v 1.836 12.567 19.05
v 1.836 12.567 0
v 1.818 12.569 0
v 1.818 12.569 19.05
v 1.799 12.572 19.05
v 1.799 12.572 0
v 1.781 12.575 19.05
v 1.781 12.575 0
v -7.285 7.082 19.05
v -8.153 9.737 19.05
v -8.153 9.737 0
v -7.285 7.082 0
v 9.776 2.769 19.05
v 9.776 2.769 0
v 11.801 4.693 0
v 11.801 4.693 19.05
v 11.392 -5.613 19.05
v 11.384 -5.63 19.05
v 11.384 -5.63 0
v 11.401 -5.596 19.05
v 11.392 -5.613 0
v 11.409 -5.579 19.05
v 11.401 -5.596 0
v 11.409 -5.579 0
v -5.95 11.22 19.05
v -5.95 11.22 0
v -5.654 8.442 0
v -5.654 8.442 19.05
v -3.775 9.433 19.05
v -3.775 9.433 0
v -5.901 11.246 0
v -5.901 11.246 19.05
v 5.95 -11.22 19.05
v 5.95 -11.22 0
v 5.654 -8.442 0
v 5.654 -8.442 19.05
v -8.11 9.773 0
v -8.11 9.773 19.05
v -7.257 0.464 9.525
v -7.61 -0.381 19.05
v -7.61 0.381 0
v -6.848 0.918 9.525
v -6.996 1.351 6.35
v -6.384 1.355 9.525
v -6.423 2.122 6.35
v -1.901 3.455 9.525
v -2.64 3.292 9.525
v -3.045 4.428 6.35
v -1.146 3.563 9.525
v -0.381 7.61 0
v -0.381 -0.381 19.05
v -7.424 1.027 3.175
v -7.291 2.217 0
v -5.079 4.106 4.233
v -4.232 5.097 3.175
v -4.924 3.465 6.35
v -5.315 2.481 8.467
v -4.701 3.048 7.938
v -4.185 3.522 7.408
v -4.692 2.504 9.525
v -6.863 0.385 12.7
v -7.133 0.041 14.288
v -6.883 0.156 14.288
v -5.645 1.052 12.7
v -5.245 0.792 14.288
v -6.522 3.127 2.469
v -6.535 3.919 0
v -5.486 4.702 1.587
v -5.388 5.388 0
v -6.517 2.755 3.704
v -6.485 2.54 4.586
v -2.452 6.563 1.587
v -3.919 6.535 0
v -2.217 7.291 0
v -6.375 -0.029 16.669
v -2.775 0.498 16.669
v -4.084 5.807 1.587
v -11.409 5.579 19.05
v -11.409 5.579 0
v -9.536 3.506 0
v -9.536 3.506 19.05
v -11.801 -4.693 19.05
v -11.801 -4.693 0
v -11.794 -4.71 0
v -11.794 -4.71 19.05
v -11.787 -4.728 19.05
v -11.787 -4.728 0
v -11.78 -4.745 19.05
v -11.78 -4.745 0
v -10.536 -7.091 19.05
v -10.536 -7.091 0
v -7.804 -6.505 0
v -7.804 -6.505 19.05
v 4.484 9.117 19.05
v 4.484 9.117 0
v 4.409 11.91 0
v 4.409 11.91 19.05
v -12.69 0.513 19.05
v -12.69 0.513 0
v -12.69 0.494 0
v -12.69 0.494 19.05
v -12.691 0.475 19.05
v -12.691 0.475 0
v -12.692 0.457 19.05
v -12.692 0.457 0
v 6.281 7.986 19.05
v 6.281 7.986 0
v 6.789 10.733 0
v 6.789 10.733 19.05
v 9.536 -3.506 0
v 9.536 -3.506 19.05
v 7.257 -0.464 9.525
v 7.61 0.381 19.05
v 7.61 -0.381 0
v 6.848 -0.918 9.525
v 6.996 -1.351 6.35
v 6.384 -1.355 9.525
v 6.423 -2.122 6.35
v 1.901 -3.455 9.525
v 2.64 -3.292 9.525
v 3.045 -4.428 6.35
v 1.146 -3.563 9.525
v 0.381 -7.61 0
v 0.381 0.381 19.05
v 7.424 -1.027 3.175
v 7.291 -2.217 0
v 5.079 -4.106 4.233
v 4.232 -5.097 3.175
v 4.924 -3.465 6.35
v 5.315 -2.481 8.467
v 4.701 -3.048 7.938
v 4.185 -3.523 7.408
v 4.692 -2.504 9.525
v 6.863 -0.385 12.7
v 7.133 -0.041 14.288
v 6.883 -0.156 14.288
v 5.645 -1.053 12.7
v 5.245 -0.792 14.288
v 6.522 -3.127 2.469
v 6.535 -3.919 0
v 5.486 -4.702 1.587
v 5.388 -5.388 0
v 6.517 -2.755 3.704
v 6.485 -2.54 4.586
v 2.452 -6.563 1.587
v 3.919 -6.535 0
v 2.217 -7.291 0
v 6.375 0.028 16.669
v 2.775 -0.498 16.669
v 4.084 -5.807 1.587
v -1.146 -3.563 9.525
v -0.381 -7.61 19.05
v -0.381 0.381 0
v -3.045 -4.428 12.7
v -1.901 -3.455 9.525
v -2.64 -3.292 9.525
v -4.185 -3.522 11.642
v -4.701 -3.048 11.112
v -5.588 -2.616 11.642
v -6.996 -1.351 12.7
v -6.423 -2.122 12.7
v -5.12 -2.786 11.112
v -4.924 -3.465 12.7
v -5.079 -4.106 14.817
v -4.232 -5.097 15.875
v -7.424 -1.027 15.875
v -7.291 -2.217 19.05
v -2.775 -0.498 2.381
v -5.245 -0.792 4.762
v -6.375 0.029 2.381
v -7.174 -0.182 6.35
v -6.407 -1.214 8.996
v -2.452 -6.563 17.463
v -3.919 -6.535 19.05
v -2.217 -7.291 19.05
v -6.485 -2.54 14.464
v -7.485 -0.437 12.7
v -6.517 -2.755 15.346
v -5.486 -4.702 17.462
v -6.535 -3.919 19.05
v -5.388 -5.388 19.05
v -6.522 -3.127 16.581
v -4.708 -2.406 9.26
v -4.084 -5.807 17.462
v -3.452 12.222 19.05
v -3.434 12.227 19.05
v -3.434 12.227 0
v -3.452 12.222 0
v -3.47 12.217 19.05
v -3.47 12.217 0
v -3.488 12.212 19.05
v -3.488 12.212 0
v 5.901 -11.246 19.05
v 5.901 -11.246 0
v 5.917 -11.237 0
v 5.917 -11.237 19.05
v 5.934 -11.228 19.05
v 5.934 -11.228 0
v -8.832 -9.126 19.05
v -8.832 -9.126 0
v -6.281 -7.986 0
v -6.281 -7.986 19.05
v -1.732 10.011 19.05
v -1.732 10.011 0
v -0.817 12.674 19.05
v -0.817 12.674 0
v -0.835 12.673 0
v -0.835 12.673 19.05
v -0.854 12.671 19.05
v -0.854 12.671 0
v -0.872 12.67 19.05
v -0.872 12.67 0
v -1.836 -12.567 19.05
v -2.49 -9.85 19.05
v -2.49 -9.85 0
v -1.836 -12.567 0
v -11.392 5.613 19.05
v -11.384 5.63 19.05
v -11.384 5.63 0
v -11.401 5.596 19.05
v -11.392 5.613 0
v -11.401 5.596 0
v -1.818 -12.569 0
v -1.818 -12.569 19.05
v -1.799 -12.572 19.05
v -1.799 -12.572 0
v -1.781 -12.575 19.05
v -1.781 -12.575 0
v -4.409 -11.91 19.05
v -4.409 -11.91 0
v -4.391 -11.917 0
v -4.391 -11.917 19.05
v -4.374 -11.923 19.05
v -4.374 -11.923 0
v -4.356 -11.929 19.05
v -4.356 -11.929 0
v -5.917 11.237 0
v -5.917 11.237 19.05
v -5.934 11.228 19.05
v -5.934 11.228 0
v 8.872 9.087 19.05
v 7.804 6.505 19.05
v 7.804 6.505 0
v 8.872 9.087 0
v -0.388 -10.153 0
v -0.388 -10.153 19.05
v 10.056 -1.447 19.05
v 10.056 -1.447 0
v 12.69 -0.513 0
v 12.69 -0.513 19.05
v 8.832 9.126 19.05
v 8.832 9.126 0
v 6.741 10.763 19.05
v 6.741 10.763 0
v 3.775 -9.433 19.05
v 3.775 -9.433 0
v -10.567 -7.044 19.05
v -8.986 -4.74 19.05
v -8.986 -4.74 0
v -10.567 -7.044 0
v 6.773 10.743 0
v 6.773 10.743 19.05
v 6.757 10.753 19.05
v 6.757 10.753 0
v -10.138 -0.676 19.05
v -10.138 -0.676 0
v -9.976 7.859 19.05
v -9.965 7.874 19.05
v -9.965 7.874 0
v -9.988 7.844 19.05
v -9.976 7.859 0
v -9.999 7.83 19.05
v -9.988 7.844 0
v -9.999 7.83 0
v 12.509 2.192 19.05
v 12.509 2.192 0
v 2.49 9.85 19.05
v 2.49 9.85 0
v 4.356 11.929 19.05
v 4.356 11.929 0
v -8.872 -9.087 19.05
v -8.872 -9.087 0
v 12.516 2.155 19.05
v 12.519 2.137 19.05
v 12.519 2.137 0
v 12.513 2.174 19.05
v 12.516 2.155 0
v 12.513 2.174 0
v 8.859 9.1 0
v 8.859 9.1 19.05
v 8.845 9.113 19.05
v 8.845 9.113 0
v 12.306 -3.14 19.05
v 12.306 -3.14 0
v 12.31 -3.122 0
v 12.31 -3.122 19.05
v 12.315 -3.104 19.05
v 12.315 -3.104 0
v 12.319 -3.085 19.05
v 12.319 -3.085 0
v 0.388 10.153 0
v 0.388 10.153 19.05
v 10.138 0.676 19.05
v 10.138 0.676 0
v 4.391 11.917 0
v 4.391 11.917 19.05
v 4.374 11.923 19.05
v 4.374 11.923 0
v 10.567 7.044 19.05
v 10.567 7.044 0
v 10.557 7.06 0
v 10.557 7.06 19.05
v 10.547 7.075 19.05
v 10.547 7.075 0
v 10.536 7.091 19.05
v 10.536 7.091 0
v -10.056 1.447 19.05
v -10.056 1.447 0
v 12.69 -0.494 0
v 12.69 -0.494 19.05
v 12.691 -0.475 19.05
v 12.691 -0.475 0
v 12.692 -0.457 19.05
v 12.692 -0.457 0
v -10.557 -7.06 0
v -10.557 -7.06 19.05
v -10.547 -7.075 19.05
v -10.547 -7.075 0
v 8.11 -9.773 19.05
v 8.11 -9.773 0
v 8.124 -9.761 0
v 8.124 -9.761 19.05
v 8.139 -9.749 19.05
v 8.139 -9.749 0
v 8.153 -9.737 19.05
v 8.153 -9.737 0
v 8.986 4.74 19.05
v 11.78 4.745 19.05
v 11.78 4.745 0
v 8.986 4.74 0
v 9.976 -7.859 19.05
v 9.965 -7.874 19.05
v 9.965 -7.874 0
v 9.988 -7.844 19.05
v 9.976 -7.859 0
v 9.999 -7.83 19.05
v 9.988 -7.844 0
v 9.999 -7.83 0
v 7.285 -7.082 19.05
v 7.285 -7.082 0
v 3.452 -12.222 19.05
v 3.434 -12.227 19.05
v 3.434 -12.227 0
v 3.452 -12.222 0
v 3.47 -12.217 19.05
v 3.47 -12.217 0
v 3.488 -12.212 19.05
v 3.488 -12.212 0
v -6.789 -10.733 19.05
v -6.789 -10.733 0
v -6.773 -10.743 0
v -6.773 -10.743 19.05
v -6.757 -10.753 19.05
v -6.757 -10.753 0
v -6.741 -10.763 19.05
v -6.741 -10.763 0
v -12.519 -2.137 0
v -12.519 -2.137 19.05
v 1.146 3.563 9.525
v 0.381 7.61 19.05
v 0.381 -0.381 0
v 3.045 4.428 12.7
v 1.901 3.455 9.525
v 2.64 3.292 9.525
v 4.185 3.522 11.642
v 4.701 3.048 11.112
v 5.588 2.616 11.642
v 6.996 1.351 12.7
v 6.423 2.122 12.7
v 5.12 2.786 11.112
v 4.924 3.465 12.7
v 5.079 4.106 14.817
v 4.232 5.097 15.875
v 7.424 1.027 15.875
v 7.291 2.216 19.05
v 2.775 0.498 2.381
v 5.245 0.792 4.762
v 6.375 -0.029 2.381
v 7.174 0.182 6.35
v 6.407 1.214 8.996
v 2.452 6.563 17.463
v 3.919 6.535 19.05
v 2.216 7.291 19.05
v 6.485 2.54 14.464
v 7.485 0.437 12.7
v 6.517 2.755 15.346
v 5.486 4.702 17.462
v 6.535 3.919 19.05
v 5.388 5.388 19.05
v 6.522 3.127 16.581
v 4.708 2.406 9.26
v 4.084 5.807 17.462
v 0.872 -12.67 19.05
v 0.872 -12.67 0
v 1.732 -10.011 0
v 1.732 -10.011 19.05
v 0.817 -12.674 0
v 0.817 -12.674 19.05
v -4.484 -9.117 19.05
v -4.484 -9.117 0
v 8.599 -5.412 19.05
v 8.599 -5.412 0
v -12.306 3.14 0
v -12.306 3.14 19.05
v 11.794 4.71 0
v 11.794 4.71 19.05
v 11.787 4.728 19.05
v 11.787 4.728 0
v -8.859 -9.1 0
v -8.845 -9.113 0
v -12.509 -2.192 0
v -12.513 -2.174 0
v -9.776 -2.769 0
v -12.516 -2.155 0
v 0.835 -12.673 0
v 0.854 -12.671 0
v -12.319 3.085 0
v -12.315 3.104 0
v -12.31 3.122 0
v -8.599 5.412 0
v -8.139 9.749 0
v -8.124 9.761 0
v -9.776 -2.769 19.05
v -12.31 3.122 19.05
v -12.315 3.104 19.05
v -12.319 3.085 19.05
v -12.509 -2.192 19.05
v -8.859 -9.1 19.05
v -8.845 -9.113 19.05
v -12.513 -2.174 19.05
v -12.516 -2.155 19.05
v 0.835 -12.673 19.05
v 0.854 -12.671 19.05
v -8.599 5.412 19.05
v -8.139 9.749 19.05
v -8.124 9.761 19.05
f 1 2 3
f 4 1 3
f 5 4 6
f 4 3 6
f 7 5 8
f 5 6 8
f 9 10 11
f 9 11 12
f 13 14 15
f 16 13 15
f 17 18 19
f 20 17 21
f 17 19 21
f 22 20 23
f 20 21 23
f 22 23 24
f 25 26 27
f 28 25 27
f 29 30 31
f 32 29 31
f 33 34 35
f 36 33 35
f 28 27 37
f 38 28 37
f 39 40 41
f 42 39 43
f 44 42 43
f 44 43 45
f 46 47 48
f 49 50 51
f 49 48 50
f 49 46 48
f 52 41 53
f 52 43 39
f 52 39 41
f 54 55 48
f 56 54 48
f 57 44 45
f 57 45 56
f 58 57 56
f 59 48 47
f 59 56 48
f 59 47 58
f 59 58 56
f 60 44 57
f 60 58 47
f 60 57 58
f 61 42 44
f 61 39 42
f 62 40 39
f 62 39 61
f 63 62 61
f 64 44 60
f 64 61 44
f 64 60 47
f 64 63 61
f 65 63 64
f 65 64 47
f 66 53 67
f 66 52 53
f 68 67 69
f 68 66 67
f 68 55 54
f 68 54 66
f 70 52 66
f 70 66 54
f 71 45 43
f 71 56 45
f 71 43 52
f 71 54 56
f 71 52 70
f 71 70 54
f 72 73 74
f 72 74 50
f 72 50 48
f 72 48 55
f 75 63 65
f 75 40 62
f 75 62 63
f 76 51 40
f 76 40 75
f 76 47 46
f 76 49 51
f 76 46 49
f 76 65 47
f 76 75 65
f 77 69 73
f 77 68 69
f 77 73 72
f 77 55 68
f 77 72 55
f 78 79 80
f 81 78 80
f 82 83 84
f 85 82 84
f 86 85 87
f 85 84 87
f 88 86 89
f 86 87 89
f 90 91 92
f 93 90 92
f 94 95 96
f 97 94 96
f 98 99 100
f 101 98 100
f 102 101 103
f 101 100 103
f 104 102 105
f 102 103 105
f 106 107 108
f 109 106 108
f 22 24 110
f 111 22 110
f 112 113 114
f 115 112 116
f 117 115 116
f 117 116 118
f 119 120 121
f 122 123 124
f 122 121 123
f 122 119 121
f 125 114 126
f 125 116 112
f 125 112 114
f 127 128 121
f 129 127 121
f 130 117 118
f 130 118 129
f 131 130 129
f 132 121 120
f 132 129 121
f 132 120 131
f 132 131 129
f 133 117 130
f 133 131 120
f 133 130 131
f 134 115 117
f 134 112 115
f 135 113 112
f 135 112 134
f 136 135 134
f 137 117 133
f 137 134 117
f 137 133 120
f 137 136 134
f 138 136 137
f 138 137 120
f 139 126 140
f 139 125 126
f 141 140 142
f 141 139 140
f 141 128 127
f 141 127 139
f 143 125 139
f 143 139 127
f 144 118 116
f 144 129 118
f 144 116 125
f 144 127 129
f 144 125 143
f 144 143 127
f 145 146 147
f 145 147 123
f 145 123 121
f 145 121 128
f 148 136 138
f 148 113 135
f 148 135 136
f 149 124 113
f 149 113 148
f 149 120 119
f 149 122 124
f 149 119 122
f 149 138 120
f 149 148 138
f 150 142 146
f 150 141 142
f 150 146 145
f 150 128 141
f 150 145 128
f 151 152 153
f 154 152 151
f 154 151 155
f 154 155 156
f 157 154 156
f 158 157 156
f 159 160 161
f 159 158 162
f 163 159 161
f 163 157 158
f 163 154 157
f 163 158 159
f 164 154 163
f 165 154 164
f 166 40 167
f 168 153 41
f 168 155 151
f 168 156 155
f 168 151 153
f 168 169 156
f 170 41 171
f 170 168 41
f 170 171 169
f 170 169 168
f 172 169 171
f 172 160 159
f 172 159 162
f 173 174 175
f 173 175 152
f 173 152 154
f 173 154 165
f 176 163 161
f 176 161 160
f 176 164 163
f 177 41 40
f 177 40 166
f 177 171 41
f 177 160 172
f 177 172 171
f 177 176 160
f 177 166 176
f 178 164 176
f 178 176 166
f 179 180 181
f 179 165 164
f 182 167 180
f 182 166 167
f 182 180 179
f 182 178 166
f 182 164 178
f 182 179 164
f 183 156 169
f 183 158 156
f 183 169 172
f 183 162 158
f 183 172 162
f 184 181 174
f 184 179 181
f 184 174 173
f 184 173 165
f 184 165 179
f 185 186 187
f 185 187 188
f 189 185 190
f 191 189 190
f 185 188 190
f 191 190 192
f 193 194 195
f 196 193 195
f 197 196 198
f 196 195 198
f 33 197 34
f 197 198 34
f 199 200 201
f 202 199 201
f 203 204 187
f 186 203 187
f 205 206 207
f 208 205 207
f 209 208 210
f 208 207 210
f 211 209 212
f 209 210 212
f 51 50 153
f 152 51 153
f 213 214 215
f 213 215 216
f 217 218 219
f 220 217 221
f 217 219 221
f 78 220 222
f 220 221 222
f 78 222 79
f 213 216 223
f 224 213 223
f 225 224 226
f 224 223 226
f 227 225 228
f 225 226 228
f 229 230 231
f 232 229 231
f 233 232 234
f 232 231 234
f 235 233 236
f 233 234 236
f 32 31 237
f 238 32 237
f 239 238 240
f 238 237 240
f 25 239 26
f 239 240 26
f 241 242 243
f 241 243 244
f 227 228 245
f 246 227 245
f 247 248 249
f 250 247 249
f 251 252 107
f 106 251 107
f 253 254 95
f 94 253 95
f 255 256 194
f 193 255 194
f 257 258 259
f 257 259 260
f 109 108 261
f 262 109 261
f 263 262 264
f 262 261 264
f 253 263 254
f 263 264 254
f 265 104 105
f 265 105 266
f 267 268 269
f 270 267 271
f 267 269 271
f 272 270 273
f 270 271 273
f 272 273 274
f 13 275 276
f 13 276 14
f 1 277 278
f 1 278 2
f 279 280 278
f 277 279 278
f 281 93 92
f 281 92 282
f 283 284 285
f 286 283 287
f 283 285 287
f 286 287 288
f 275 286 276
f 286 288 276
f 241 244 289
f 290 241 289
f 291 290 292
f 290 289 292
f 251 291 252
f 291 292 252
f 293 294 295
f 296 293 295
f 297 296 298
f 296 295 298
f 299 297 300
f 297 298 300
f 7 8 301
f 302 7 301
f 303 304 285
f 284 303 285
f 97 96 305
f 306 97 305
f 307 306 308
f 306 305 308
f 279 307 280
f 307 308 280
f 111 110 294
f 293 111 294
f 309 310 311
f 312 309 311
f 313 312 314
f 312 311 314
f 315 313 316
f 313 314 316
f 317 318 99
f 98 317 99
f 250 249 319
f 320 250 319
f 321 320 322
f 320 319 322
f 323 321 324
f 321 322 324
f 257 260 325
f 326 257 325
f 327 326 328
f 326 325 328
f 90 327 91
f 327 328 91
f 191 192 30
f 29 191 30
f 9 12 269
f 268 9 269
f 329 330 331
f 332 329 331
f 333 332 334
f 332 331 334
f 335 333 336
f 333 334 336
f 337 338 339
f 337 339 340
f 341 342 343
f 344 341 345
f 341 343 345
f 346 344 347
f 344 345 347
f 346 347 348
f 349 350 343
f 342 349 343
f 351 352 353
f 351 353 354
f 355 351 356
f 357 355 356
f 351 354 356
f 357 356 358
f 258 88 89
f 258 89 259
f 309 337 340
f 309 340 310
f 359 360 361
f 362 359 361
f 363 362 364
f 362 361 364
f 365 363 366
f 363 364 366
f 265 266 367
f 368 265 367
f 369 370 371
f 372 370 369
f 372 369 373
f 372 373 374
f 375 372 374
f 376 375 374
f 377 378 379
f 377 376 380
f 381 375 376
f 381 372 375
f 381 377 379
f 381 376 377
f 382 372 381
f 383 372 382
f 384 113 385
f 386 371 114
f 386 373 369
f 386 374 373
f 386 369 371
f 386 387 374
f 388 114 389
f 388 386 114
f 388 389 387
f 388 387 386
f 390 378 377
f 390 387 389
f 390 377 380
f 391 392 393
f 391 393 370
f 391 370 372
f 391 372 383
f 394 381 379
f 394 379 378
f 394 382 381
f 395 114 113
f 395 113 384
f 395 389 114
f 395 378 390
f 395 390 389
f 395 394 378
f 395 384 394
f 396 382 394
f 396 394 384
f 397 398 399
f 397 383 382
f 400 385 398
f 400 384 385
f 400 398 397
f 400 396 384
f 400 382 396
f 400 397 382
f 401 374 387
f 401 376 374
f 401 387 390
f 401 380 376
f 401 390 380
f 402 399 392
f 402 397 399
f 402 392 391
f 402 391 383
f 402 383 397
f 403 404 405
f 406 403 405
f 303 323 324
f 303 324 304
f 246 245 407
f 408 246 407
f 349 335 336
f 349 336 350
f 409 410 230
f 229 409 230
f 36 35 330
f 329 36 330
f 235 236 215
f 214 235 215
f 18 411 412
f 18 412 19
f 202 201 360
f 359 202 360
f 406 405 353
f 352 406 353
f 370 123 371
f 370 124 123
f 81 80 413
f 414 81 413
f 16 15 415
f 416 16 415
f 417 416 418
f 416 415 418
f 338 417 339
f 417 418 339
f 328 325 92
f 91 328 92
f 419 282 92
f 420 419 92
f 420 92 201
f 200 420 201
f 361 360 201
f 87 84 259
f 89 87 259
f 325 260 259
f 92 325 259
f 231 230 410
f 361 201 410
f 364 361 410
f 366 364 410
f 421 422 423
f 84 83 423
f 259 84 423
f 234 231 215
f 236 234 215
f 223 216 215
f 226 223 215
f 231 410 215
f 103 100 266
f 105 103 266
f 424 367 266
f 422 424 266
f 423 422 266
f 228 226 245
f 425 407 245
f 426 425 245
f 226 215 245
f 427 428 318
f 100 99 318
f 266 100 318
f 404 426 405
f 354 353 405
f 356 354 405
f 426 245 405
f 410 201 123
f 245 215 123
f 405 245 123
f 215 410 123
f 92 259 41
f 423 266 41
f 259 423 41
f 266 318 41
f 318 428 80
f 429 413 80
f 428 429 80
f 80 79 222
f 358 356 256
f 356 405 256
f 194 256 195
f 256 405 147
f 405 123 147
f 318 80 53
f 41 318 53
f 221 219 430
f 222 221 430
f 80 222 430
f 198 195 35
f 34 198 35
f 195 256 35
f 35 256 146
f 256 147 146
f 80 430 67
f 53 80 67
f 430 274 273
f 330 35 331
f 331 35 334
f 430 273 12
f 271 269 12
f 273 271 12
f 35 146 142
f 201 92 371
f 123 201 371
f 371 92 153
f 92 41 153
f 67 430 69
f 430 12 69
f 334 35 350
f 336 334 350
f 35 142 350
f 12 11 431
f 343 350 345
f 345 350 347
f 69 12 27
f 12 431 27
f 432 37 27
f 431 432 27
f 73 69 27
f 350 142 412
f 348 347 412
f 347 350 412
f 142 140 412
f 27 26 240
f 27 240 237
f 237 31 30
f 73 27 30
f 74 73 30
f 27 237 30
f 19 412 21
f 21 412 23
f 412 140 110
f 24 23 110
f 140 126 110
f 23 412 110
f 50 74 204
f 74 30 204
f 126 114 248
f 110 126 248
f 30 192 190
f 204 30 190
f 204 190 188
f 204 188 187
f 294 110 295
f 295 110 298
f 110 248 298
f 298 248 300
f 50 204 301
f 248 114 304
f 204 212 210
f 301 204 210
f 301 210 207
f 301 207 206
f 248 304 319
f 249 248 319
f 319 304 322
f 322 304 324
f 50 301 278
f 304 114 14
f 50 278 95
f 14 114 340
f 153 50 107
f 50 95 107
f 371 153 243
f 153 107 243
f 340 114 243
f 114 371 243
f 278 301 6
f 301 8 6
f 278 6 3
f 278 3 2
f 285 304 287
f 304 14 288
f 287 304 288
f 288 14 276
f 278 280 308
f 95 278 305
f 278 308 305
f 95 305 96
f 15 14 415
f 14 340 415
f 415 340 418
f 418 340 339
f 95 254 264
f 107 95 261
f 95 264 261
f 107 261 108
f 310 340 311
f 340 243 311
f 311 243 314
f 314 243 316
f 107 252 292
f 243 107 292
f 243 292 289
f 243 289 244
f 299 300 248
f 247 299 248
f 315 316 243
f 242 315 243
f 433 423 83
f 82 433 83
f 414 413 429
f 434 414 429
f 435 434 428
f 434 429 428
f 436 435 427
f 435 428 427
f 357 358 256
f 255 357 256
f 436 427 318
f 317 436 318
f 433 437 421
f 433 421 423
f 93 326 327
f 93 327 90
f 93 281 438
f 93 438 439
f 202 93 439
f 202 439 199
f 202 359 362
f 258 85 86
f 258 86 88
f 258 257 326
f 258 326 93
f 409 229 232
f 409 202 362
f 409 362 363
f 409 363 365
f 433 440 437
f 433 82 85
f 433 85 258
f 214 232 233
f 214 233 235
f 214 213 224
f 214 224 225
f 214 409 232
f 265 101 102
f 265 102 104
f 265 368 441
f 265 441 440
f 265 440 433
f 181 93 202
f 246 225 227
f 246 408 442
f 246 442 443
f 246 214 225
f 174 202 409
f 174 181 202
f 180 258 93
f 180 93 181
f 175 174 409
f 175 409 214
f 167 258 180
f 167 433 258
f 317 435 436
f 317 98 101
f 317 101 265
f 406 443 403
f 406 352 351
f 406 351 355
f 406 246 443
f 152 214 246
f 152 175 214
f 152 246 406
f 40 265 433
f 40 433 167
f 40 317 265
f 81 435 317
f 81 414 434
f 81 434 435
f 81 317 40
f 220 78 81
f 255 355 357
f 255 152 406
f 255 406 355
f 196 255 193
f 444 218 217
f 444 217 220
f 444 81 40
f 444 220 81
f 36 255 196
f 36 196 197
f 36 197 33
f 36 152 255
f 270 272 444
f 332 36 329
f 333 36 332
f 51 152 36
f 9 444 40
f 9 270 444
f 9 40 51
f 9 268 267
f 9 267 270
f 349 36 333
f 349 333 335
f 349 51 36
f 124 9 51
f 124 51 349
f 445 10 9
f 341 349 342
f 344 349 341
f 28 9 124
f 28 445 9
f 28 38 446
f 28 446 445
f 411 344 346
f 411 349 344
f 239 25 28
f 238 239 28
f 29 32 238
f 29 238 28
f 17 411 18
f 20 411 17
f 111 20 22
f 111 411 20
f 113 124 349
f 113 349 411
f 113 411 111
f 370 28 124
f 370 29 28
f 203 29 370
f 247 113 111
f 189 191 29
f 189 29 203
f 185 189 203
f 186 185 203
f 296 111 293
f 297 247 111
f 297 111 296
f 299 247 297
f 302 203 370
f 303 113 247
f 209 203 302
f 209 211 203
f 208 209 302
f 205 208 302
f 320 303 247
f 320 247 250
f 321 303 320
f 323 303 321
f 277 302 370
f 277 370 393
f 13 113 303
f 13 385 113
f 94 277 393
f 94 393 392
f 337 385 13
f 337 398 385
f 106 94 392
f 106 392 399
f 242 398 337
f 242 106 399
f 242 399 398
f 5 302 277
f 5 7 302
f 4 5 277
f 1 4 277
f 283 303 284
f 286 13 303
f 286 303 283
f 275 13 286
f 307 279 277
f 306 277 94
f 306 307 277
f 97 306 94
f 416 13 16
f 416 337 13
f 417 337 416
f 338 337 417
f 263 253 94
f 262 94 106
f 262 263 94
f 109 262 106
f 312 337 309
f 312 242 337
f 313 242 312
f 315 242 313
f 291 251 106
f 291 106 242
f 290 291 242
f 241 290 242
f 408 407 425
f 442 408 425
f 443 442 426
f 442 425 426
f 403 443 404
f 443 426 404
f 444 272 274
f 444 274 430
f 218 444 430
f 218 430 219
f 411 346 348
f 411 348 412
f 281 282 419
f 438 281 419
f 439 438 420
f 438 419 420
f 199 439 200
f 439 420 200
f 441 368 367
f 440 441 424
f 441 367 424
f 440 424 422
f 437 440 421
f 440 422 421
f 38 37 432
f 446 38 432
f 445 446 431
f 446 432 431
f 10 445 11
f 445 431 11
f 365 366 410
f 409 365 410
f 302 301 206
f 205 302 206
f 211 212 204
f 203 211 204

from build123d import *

# Parameters (mm, degrees)
F1_DEPTH = 19.05


with BuildPart() as f1:
    # F0 (on Top) → F1 (new body)
    with BuildSketch(Plane.XY):
        with BuildLine():
            ThreePointArc((10.16, 0), (10.154376, 0.337992), (10.137512, 0.675609))
            ThreePointArc((10.137512, 0.675609), (10.011357, 1.731566), (9.775516, 2.768553))
            ThreePointArc((9.775516, 2.768553), (9.432572, 3.775206), (8.986283, 4.740497))
            ThreePointArc((8.986283, 4.740497), (8.441539, 5.653851), (7.804307, 6.505259))
            ThreePointArc((7.804307, 6.505259), (7.081569, 7.285395), (6.281244, 7.98571))
            ThreePointArc((6.281244, 7.98571), (5.412101, 8.598533), (4.483662, 9.117148))
            ThreePointArc((4.483662, 9.117148), (3.506098, 9.535873), (2.490121, 9.850122))
            ThreePointArc((2.490121, 9.850122), (1.446862, 10.05645), (0.387751, 10.152598))
            ThreePointArc((0.387751, 10.152598), (-0.675609, 10.137512), (-1.731566, 10.011357))
            ThreePointArc((-1.731566, 10.011357), (-2.768553, 9.775516), (-3.775206, 9.432572))
            ThreePointArc((-3.775206, 9.432572), (-4.740497, 8.986283), (-5.653851, 8.441539))
            ThreePointArc((-5.653851, 8.441539), (-6.505259, 7.804307), (-7.285395, 7.081569))
            ThreePointArc((-7.285395, 7.081569), (-7.98571, 6.281244), (-8.598533, 5.412101))
            ThreePointArc((-8.598533, 5.412101), (-9.117148, 4.483662), (-9.535873, 3.506098))
            ThreePointArc((-9.535873, 3.506098), (-9.850122, 2.490121), (-10.05645, 1.446862))
            ThreePointArc((-10.05645, 1.446862), (-10.152598, 0.387751), (-10.137512, -0.675609))
            ThreePointArc((-10.137512, -0.675609), (-10.011357, -1.731566), (-9.775516, -2.768553))
            ThreePointArc((-9.775516, -2.768553), (-9.432572, -3.775206), (-8.986283, -4.740497))
            ThreePointArc((-8.986283, -4.740497), (-8.441539, -5.653851), (-7.804307, -6.505259))
            ThreePointArc((-7.804307, -6.505259), (-7.081569, -7.285395), (-6.281244, -7.98571))
            ThreePointArc((-6.281244, -7.98571), (-5.412101, -8.598533), (-4.483662, -9.117148))
            ThreePointArc((-4.483662, -9.117148), (-3.506098, -9.535873), (-2.490121, -9.850122))
            ThreePointArc((-2.490121, -9.850122), (-1.446862, -10.05645), (-0.387751, -10.152598))
            ThreePointArc((-0.387751, -10.152598), (0.675609, -10.137512), (1.731566, -10.011357))
            ThreePointArc((1.731566, -10.011357), (2.768553, -9.775516), (3.775206, -9.432572))
            ThreePointArc((3.775206, -9.432572), (4.740497, -8.986283), (5.653851, -8.441539))
            ThreePointArc((5.653851, -8.441539), (6.505259, -7.804307), (7.285395, -7.081569))
            ThreePointArc((7.285395, -7.081569), (7.98571, -6.281244), (8.598533, -5.412101))
            ThreePointArc((8.598533, -5.412101), (9.117148, -4.483662), (9.535873, -3.506098))
            ThreePointArc((9.535873, -3.506098), (9.850122, -2.490121), (10.05645, -1.446862))
            ThreePointArc((10.05645, -1.446862), (10.134079, -0.725281), (10.16, 0))
        make_face()
        with BuildLine():
            ThreePointArc((0.387751, 10.152598), (1.446862, 10.05645), (2.490121, 9.850122))
            Line((2.490121, 9.850122), (1.836296, 12.566544))
            ThreePointArc((1.836296, 12.566544), (1.808578, 12.570563), (1.780851, 12.574521))
            Line((1.780851, 12.574521), (0.387751, 10.152598))
        make_face()
        with BuildLine():
            ThreePointArc((2.490121, 9.850122), (3.506098, 9.535873), (4.483662, 9.117148))
            Line((4.483662, 9.117148), (4.4089, 11.910147))
            ThreePointArc((4.4089, 11.910147), (4.382623, 11.919841), (4.356325, 11.929478))
            Line((4.356325, 11.929478), (2.490121, 9.850122))
        make_face()
        with BuildLine():
            ThreePointArc((4.483662, 9.117148), (5.412101, 8.598533), (6.281244, 7.98571))
            Line((6.281244, 7.98571), (6.788813, 10.73322))
            ThreePointArc((6.788813, 10.73322), (6.765126, 10.748166), (6.741406, 10.763059))
            Line((6.741406, 10.763059), (4.483662, 9.117148))
        make_face()
        with BuildLine():
            ThreePointArc((6.281244, 7.98571), (7.081569, 7.285395), (7.804307, 6.505259))
            Line((7.804307, 6.505259), (8.872024, 9.0872))
            ThreePointArc((8.872024, 9.0872), (8.851961, 9.106744), (8.831856, 9.126243))
            Line((8.831856, 9.126243), (6.281244, 7.98571))
        make_face()
        with BuildLine():
            ThreePointArc((7.804307, 6.505259), (8.441539, 5.653851), (8.986283, 4.740497))
            Line((8.986283, 4.740497), (10.567484, 7.044025))
            ThreePointArc((10.567484, 7.044025), (10.551923, 7.067313), (10.536312, 7.090567))
            Line((10.536312, 7.090567), (7.804307, 6.505259))
        make_face()
        with BuildLine():
            Line((9.775516, 2.768553), (11.801094, 4.692993))
            ThreePointArc((11.801094, 4.692993), (11.790715, 4.719007), (11.78028, 4.744999))
            Line((11.78028, 4.744999), (8.986283, 4.740497))
            ThreePointArc((8.986283, 4.740497), (9.432572, 3.775206), (9.775516, 2.768553))
        make_face()
        with BuildLine():
            Line((10.137512, 0.675609), (12.51894, 2.136854))
            ThreePointArc((12.51894, 2.136854), (12.514197, 2.164458), (12.509393, 2.192051))
            Line((12.509393, 2.192051), (9.775516, 2.768553))
            ThreePointArc((9.775516, 2.768553), (10.011357, 1.731566), (10.137512, 0.675609))
        make_face()
        with BuildLine():
            ThreePointArc((12.305758, -3.139798), (12.312652, -3.112652), (12.319487, -3.08549))
            Line((12.319487, -3.08549), (10.05645, -1.446862))
            ThreePointArc((10.05645, -1.446862), (9.850122, -2.490121), (9.535873, -3.506098))
            Line((9.535873, -3.506098), (12.305758, -3.139798))
        make_face()
        with BuildLine():
            Line((9.999429, -7.829522), (8.598533, -5.412101))
            ThreePointArc((8.598533, -5.412101), (7.98571, -6.281244), (7.285395, -7.081569))
            Line((7.285395, -7.081569), (9.964798, -7.873551))
            ThreePointArc((9.964798, -7.873551), (9.982138, -7.851555), (9.999429, -7.829522))
        make_face()
        with BuildLine():
            Line((8.153068, -9.737427), (7.285395, -7.081569))
            ThreePointArc((7.285395, -7.081569), (6.505259, -7.804307), (5.653851, -8.441539))
            Line((5.653851, -8.441539), (8.11004, -9.773293))
            ThreePointArc((8.11004, -9.773293), (8.131574, -9.755383), (8.153068, -9.737427))
        make_face()
        with BuildLine():
            Line((5.950379, -11.219759), (5.653851, -8.441539))
            ThreePointArc((5.653851, -8.441539), (4.740497, -8.986283), (3.775206, -9.432572))
            Line((3.775206, -9.432572), (5.900834, -11.245895))
            ThreePointArc((5.900834, -11.245895), (5.925621, -11.232854), (5.950379, -11.219759))
        make_face()
        with BuildLine():
            Line((3.48763, -12.211733), (3.775206, -9.432572))
            ThreePointArc((3.775206, -9.432572), (2.768553, -9.775516), (1.731566, -10.011357))
            Line((1.731566, -10.011357), (3.433734, -12.226998))
            ThreePointArc((3.433734, -12.226998), (3.460691, -12.219395), (3.48763, -12.211733))
        make_face()
        with BuildLine():
            Line((0.872455, -12.669997), (1.731566, -10.011357))
            ThreePointArc((1.731566, -10.011357), (0.675609, -10.137512), (-0.387751, -10.152598))
            Line((-0.387751, -10.152598), (0.816563, -12.673722))
            ThreePointArc((0.816563, -12.673722), (0.844511, -12.67189), (0.872455, -12.669997))
        make_face()
        with BuildLine():
            Line((-1.780851, -12.574521), (-0.387751, -10.152598))
            ThreePointArc((-0.387751, -10.152598), (-1.446862, -10.05645), (-2.490121, -9.850122))
            Line((-2.490121, -9.850122), (-1.836296, -12.566544))
            ThreePointArc((-1.836296, -12.566544), (-1.808578, -12.570563), (-1.780851, -12.574521))
        make_face()
        with BuildLine():
            Line((-4.356325, -11.929478), (-2.490121, -9.850122))
            ThreePointArc((-2.490121, -9.850122), (-3.506098, -9.535873), (-4.483662, -9.117148))
            Line((-4.483662, -9.117148), (-4.4089, -11.910147))
            ThreePointArc((-4.4089, -11.910147), (-4.382623, -11.919841), (-4.356325, -11.929478))
        make_face()
        with BuildLine():
            Line((-6.741406, -10.763059), (-4.483662, -9.117148))
            ThreePointArc((-4.483662, -9.117148), (-5.412101, -8.598533), (-6.281244, -7.98571))
            Line((-6.281244, -7.98571), (-6.788813, -10.73322))
            ThreePointArc((-6.788813, -10.73322), (-6.765126, -10.748166), (-6.741406, -10.763059))
        make_face()
        with BuildLine():
            Line((-8.831856, -9.126243), (-6.281244, -7.98571))
            ThreePointArc((-6.281244, -7.98571), (-7.081569, -7.285395), (-7.804307, -6.505259))
            Line((-7.804307, -6.505259), (-8.872024, -9.0872))
            ThreePointArc((-8.872024, -9.0872), (-8.851961, -9.106744), (-8.831856, -9.126243))
        make_face()
        with BuildLine():
            Line((-10.536312, -7.090567), (-7.804307, -6.505259))
            ThreePointArc((-7.804307, -6.505259), (-8.441539, -5.653851), (-8.986283, -4.740497))
            Line((-8.986283, -4.740497), (-10.567484, -7.044025))
            ThreePointArc((-10.567484, -7.044025), (-10.551923, -7.067313), (-10.536312, -7.090567))
        make_face()
        with BuildLine():
            Line((-11.78028, -4.744999), (-8.986283, -4.740497))
            ThreePointArc((-8.986283, -4.740497), (-9.432572, -3.775206), (-9.775516, -2.768553))
            Line((-9.775516, -2.768553), (-11.801094, -4.692993))
            ThreePointArc((-11.801094, -4.692993), (-11.790715, -4.719007), (-11.78028, -4.744999))
        make_face()
        with BuildLine():
            Line((-12.509393, -2.192051), (-9.775516, -2.768553))
            ThreePointArc((-9.775516, -2.768553), (-10.011357, -1.731566), (-10.137512, -0.675609))
            Line((-10.137512, -0.675609), (-12.51894, -2.136854))
            ThreePointArc((-12.51894, -2.136854), (-12.514197, -2.164458), (-12.509393, -2.192051))
        make_face()
        with BuildLine():
            ThreePointArc((-8.598533, 5.412101), (-7.98571, 6.281244), (-7.285395, 7.081569))
            Line((-7.285395, 7.081569), (-9.964798, 7.873551))
            ThreePointArc((-9.964798, 7.873551), (-9.982138, 7.851555), (-9.999429, 7.829522))
            Line((-9.999429, 7.829522), (-8.598533, 5.412101))
        make_face()
        with BuildLine():
            ThreePointArc((-7.285395, 7.081569), (-6.505259, 7.804307), (-5.653851, 8.441539))
            Line((-5.653851, 8.441539), (-8.11004, 9.773293))
            ThreePointArc((-8.11004, 9.773293), (-8.131574, 9.755383), (-8.153068, 9.737427))
            Line((-8.153068, 9.737427), (-7.285395, 7.081569))
        make_face()
        with BuildLine():
            ThreePointArc((-5.653851, 8.441539), (-4.740497, 8.986283), (-3.775206, 9.432572))
            Line((-3.775206, 9.432572), (-5.900834, 11.245895))
            ThreePointArc((-5.900834, 11.245895), (-5.925621, 11.232854), (-5.950379, 11.219759))
            Line((-5.950379, 11.219759), (-5.653851, 8.441539))
        make_face()
        with BuildLine():
            ThreePointArc((-3.775206, 9.432572), (-2.768553, 9.775516), (-1.731566, 10.011357))
            Line((-1.731566, 10.011357), (-3.433734, 12.226998))
            ThreePointArc((-3.433734, 12.226998), (-3.460691, 12.219395), (-3.48763, 12.211733))
            Line((-3.48763, 12.211733), (-3.775206, 9.432572))
        make_face()
        with BuildLine():
            ThreePointArc((-1.731566, 10.011357), (-0.675609, 10.137512), (0.387751, 10.152598))
            Line((0.387751, 10.152598), (-0.816563, 12.673722))
            ThreePointArc((-0.816563, 12.673722), (-0.844511, 12.67189), (-0.872455, 12.669997))
            Line((-0.872455, 12.669997), (-1.731566, 10.011357))
        make_face()
        with BuildLine():
            ThreePointArc((-9.535873, 3.506098), (-9.117148, 4.483662), (-8.598533, 5.412101))
            Line((-8.598533, 5.412101), (-11.384047, 5.629697))
            ThreePointArc((-11.384047, 5.629697), (-11.396434, 5.604577), (-11.408767, 5.57943))
            Line((-11.408767, 5.57943), (-9.535873, 3.506098))
        make_face()
        with BuildLine():
            ThreePointArc((-10.05645, 1.446862), (-9.850122, 2.490121), (-9.535873, 3.506098))
            Line((-9.535873, 3.506098), (-12.305758, 3.139798))
            ThreePointArc((-12.305758, 3.139798), (-12.312652, 3.112652), (-12.319487, 3.08549))
            Line((-12.319487, 3.08549), (-10.05645, 1.446862))
        make_face()
        with BuildLine():
            ThreePointArc((-10.137512, -0.675609), (-10.152598, 0.387751), (-10.05645, 1.446862))
            Line((-10.05645, 1.446862), (-12.689648, 0.512675))
            ThreePointArc((-12.689648, 0.512675), (-12.690748, 0.484688), (-12.691786, 0.4567))
            Line((-12.691786, 0.4567), (-10.137512, -0.675609))
        make_face()
        with BuildLine():
            Line((11.408767, -5.57943), (9.535873, -3.506098))
            ThreePointArc((9.535873, -3.506098), (9.117148, -4.483662), (8.598533, -5.412101))
            Line((8.598533, -5.412101), (11.384047, -5.629697))
            ThreePointArc((11.384047, -5.629697), (11.396434, -5.604577), (11.408767, -5.57943))
        make_face()
        with BuildLine():
            ThreePointArc((12.689648, -0.512675), (12.690748, -0.484688), (12.691786, -0.4567))
            Line((12.691786, -0.4567), (10.137512, 0.675609))
            ThreePointArc((10.137512, 0.675609), (10.154376, 0.337992), (10.16, 0))
            ThreePointArc((10.16, 0), (10.134079, -0.725281), (10.05645, -1.446862))
            Line((10.05645, -1.446862), (12.689648, -0.512675))
        make_face()
    extrude(amount=F1_DEPTH)

    # F2 (on face) → F4 section 0
    with BuildSketch(Plane(origin=(0, 0, 0), x_dir=(1, 0, 0), z_dir=(0, 0, -1))):
        with BuildLine():
            Line((-0.381, -0.381), (-7.610469, -0.381))
            ThreePointArc((-7.610469, -0.381), (-5.388154, -5.388154), (-0.381, -7.610469))
            Line((-0.381, -7.610469), (-0.381, -0.381))
        make_face()
    # F3 (on face) → F4 section 1
    with BuildSketch(Plane.XY.offset(19.05)):
        with BuildLine():
            Line((-0.381, -0.381), (-7.610469, -0.381))
            ThreePointArc((-7.610469, -0.381), (-5.388154, -5.388154), (-0.381, -7.610469))
            Line((-0.381, -7.610469), (-0.381, -0.381))
        make_face()
    loft(mode=Mode.SUBTRACT)

    # F6 (on face) → F7 section 0
    with BuildSketch(Plane(origin=(0, 0, 0), x_dir=(1, 0, 0), z_dir=(0, 0, -1))):
        with BuildLine():
            Line((0.381, 0.381), (7.610469, 0.381))
            ThreePointArc((7.610469, 0.381), (5.388154, 5.388154), (0.381, 7.610469))
            Line((0.381, 7.610469), (0.381, 0.381))
        make_face()
    # F5 (on face) → F7 section 1
    with BuildSketch(Plane.XY.offset(19.05)):
        with BuildLine():
            Line((0.380881, 0.380881), (7.610475, 0.380881))
            ThreePointArc((7.610475, 0.380881), (5.388154, 5.388154), (0.380881, 7.610475))
            Line((0.380881, 7.610475), (0.380881, 0.380881))
        make_face()
    loft(mode=Mode.SUBTRACT)


solid = f1.part
